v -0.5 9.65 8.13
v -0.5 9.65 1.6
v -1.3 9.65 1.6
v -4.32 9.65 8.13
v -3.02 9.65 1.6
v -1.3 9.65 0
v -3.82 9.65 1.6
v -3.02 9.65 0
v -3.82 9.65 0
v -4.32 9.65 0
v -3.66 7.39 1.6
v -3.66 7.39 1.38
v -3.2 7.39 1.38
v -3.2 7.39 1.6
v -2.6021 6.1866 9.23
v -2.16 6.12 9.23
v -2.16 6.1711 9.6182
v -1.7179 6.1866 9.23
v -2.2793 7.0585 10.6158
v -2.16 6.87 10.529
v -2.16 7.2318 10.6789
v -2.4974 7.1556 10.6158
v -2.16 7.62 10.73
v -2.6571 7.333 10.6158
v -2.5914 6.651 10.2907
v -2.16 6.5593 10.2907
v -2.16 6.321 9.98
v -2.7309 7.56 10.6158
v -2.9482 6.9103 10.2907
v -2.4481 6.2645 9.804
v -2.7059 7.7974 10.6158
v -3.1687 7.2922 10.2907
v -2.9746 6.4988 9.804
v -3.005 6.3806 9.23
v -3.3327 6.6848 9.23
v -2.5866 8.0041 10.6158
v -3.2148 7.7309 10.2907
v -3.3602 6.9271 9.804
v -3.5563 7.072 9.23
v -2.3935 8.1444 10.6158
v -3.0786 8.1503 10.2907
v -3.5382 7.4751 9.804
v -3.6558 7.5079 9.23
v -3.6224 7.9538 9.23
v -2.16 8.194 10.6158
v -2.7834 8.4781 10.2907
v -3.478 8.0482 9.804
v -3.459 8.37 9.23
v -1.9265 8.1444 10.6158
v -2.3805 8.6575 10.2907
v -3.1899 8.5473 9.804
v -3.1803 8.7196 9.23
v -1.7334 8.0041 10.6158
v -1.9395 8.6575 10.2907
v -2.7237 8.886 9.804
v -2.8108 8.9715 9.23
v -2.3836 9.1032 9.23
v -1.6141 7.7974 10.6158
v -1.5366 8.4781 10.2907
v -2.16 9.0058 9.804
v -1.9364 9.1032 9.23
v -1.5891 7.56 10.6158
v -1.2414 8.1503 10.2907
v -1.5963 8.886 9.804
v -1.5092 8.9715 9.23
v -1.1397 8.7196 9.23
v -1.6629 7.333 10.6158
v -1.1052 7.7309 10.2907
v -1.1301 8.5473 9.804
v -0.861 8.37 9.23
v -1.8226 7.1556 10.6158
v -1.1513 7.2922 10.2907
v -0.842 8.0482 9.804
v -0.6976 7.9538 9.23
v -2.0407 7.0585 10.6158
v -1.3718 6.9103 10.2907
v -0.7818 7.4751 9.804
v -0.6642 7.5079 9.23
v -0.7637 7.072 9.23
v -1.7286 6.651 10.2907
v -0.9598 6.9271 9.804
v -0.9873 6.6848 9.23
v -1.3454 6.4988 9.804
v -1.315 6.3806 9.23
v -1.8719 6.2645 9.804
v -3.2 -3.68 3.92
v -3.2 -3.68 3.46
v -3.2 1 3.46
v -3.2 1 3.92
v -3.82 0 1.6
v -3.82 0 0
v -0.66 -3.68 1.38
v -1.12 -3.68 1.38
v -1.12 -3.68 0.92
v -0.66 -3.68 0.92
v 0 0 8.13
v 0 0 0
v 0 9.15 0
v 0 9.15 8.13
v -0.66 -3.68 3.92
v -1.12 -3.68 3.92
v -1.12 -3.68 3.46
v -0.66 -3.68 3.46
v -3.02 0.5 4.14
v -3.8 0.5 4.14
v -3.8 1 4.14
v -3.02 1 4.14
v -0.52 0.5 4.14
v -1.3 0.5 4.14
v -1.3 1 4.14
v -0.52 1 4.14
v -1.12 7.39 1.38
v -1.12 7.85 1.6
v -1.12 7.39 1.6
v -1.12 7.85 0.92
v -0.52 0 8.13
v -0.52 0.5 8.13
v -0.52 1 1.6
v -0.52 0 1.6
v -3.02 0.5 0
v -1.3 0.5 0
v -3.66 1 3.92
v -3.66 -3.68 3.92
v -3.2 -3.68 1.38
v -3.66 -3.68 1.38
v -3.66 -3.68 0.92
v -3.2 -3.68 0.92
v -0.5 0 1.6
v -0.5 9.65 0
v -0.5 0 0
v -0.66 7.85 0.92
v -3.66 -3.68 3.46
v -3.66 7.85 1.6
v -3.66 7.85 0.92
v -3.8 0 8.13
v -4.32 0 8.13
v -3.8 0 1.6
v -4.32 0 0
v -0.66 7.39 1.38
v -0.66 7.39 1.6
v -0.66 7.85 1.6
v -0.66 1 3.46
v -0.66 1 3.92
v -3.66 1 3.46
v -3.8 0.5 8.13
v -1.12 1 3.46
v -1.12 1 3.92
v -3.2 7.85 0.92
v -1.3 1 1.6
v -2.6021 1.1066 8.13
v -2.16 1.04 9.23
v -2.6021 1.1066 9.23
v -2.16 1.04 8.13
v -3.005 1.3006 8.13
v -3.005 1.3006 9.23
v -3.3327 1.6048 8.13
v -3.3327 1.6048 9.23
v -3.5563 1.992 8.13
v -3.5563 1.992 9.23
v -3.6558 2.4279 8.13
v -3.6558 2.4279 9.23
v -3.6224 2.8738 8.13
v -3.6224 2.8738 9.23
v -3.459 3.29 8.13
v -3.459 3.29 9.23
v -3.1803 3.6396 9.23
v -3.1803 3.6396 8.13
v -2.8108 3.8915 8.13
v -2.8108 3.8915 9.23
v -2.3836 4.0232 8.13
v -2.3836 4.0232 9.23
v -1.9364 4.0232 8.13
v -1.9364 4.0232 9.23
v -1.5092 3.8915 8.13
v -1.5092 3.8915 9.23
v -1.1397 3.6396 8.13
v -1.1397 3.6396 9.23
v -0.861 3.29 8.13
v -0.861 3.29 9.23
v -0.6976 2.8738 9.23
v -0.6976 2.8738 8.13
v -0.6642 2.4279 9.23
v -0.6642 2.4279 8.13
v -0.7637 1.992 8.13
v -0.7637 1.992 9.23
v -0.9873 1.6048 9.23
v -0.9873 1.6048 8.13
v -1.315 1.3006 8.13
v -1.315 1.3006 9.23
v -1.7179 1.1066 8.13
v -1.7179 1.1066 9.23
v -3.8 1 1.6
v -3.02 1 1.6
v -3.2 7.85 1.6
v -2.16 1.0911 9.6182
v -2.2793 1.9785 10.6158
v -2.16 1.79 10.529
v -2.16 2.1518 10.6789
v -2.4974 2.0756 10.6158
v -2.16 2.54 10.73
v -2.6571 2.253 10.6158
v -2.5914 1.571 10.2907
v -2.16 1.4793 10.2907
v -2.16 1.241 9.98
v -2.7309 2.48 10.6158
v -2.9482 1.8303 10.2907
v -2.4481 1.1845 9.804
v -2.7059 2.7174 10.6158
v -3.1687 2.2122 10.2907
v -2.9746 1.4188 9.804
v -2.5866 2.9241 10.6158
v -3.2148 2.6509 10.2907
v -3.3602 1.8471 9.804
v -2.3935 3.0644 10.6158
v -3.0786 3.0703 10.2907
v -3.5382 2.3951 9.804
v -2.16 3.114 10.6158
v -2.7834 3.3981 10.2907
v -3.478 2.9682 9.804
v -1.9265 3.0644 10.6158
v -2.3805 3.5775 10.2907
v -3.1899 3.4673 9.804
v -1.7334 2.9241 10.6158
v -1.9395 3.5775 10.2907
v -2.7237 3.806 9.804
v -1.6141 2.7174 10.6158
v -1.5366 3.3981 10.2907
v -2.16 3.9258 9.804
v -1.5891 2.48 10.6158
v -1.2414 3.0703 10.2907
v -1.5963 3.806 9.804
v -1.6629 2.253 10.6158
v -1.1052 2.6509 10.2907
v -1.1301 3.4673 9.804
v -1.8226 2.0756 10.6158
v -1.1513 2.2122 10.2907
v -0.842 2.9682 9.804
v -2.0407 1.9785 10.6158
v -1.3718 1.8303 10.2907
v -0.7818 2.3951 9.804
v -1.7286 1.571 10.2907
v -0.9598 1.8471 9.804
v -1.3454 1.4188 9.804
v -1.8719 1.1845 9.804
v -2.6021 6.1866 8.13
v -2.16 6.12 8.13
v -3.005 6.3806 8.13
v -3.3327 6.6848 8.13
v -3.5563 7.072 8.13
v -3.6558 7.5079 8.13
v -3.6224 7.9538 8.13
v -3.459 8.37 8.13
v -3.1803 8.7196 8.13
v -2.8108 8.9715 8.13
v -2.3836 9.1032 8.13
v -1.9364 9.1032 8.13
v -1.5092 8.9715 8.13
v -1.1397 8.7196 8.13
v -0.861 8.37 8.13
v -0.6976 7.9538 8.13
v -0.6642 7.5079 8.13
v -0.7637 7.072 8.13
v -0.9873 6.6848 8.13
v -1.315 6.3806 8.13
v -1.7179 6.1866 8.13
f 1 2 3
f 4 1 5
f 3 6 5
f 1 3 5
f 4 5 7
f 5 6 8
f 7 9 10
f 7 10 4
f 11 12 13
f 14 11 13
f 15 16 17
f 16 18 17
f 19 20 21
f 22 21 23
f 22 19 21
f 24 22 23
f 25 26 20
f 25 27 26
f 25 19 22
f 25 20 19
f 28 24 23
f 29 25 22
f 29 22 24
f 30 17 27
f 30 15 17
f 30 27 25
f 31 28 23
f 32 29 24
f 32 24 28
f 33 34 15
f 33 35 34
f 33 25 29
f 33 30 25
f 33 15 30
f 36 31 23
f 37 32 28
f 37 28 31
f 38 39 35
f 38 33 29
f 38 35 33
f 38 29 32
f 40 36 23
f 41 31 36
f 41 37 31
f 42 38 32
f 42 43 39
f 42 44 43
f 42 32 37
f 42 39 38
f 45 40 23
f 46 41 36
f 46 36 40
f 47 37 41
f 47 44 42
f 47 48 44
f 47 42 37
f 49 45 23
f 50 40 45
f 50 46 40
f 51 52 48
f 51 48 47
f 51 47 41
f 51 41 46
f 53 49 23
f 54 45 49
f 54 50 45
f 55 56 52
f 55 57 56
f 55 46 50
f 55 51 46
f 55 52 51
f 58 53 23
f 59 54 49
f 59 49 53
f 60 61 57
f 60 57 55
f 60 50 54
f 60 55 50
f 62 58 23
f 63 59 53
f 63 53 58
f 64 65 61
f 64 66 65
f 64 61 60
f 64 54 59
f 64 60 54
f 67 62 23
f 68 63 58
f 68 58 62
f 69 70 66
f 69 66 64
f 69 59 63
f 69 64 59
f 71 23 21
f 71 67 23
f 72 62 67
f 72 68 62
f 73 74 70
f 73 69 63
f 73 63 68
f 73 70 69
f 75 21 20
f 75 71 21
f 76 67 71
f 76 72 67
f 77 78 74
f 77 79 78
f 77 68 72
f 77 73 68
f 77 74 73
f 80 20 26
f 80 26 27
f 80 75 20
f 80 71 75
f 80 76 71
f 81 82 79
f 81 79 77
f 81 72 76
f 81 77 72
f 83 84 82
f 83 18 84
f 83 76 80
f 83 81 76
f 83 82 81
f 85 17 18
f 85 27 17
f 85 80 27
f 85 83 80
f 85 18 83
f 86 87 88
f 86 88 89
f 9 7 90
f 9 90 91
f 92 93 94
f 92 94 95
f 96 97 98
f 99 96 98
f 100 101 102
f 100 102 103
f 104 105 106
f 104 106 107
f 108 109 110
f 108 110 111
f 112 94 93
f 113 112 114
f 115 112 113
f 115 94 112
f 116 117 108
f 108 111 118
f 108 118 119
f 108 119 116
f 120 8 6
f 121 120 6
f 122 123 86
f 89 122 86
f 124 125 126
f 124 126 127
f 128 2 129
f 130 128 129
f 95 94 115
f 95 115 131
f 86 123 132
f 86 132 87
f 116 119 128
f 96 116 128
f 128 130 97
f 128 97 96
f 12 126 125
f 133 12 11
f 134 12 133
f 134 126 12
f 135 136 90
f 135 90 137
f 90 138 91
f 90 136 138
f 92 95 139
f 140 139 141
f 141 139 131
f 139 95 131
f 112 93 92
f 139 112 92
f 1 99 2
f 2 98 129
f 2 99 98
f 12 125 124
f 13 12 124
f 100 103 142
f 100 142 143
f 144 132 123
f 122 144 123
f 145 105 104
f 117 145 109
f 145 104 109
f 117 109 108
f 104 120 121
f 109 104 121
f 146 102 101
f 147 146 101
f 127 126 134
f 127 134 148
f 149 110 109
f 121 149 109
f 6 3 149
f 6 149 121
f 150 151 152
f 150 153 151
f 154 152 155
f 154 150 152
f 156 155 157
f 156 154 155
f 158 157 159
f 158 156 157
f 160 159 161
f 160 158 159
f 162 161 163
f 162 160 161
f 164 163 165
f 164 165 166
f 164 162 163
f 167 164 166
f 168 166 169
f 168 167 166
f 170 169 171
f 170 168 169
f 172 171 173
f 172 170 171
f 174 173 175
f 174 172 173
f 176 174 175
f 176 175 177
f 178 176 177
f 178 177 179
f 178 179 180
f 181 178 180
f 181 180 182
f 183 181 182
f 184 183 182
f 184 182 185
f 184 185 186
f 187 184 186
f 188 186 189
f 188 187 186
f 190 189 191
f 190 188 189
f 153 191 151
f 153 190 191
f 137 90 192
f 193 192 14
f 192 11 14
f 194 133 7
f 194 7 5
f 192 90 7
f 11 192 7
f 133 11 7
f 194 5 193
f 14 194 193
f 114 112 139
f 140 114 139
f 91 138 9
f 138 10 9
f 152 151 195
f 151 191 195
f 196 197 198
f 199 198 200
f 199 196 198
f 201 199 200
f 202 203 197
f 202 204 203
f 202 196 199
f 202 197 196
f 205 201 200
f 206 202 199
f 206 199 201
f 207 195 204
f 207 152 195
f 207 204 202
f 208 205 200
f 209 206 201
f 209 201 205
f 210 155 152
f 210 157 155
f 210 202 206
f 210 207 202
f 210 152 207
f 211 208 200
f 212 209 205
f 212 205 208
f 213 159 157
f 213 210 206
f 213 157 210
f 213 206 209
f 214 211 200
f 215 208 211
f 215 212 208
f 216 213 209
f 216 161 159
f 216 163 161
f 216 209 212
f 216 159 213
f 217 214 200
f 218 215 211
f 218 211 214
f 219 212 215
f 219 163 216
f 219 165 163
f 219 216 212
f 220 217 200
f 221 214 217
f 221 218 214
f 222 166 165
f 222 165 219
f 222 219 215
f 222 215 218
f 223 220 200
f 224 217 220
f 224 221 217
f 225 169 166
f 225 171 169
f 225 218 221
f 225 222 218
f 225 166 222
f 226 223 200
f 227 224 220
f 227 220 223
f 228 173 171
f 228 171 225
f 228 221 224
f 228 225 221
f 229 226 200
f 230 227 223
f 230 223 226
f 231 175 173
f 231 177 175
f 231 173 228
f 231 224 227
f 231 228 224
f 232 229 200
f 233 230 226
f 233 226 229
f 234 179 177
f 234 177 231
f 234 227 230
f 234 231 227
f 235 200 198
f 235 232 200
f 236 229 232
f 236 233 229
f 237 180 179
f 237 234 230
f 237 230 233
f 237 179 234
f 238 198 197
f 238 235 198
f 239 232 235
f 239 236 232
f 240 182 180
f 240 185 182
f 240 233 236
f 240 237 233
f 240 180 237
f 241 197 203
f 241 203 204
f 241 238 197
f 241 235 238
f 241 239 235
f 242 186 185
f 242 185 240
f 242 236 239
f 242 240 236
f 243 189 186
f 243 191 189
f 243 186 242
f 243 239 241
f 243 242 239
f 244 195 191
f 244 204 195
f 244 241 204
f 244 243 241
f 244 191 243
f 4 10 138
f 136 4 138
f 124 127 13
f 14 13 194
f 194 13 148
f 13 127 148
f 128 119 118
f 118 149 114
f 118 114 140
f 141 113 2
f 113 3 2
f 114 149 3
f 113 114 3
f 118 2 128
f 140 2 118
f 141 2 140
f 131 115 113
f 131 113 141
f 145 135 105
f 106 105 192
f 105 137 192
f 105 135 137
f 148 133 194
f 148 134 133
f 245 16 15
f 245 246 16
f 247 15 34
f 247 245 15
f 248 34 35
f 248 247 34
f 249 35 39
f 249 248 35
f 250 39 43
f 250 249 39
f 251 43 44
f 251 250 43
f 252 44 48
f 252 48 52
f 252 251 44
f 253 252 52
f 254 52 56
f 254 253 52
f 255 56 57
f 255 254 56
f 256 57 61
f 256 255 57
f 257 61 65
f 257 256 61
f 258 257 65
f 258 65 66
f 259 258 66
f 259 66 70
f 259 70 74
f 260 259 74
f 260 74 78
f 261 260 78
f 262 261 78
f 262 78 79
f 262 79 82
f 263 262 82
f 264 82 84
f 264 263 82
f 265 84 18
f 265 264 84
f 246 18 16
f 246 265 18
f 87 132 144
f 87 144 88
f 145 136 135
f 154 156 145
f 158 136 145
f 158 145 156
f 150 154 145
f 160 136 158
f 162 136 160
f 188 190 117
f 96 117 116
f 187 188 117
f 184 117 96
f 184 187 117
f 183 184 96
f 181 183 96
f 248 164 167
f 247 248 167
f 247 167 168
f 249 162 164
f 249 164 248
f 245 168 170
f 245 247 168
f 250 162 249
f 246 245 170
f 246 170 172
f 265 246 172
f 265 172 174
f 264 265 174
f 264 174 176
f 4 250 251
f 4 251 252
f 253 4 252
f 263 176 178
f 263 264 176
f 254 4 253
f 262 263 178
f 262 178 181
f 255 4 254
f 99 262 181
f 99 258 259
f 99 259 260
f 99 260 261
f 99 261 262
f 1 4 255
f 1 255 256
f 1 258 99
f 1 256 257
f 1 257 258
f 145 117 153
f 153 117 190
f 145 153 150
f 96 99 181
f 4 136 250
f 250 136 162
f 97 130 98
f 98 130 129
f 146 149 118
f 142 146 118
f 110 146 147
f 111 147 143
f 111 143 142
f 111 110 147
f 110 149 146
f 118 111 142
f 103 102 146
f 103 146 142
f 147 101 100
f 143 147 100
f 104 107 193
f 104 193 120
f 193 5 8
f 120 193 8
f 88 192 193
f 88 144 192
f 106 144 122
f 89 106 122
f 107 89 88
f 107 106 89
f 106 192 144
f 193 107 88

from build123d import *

# Parameters (mm, degrees)
EXTRUSION1_DEPTH   = 8.13
ESQUISSE2_W        = 0.8
ESQUISSE2_H        = 1.6
EXTRUSION2_DEPTH   = 10.55
ESQUISSE4_W        = 0.78
ESQUISSE4_H        = 2.54
EXTRUSION3_DEPTH   = 0.5
ESQUISSE5_W        = 0.46
ESQUISSE5_H        = 0.46
EXTRUSION4_DEPTH   = 4.68
ESQUISSE6_W        = 0.46
ESQUISSE6_H        = 0.46
EXTRUSION5_DEPTH   = 11.53
EXTRUSION5_2_DEPTH = 11.53
ESQUISSE7_W        = 0.46
ESQUISSE7_H        = 0.46
EXTRUSION6_DEPTH   = 0.22


with BuildPart() as part:
    # Esquisse1 → Extrusion1 (new body)
    with BuildSketch(Plane.XY):
        Polygon((-3.8, 0), (-3.8, 0.5), (-0.52, 0.5), (-0.52, 0), (0, 0), (0, 9.15), (-0.5, 9.65), (-4.32, 9.65), (-4.32, 0), align=None)
    extrude(amount=EXTRUSION1_DEPTH)

    # Esquisse2 → Extrusion2 (cut)
    with BuildSketch(Plane(origin=(0, 9.65, 0), x_dir=(1, 0, 0), z_dir=(0, 1, 0))):
        with Locations((-0.9, -0.8)):
            Rectangle(ESQUISSE2_W, ESQUISSE2_H)
        with Locations((-3.42, -0.8)):
            Rectangle(ESQUISSE2_W, ESQUISSE2_H)
    extrude(amount=-EXTRUSION2_DEPTH, mode=Mode.SUBTRACT)

    # Esquisse4 → Extrusion3 (cut)
    with BuildSketch(Plane.XZ.offset(-0.5)):
        with Locations((-3.41, 2.87)):
            Rectangle(ESQUISSE4_W, ESQUISSE4_H)
        with Locations((-0.91, 2.87)):
            Rectangle(ESQUISSE4_W, ESQUISSE4_H)
    extrude(amount=-EXTRUSION3_DEPTH, mode=Mode.SUBTRACT)

    # Esquisse5 → Extrusion4 (add)
    with BuildSketch(Plane.XZ.offset(3.68)):
        with Locations((-3.43, 3.69)):
            Rectangle(ESQUISSE5_W, ESQUISSE5_H)
        with Locations((-0.89, 3.69)):
            Rectangle(ESQUISSE5_W, ESQUISSE5_H)
    extrude(amount=-EXTRUSION4_DEPTH)



with BuildPart() as body_2:
    # Esquisse6 → Extrusion5 (new body)
    with BuildSketch(Plane.XZ.offset(3.68)):
        with Locations((-3.43, 1.15)):
            Rectangle(ESQUISSE6_W, ESQUISSE6_H)
    extrude(amount=-EXTRUSION5_DEPTH)


with BuildPart() as body_3:
    # Esquisse6 → Extrusion5 2 (new body)
    with BuildSketch(Plane.XZ.offset(3.68)):
        with Locations((-0.89, 1.15)):
            Rectangle(ESQUISSE6_W, ESQUISSE6_H)
    extrude(amount=-EXTRUSION5_2_DEPTH)


with BuildPart() as part_1:
    add(part.part)

    add(body_2.part)  # Extrusion6 merges body 2

    add(body_3.part)  # Extrusion6 merges body 3
    # Esquisse7 → Extrusion6 (add)
    with BuildSketch(Plane.XY.offset(1.38)):
        with Locations((-0.89, 7.62)):
            Rectangle(ESQUISSE7_W, ESQUISSE7_H)
        with Locations((-3.43, 7.62)):
            Rectangle(ESQUISSE7_W, ESQUISSE7_H)
    extrude(amount=EXTRUSION6_DEPTH)

    # Esquisse9 → Révolution1 (revolve)
    with BuildSketch(Plane(origin=(-2.16, 0, 0), x_dir=(0, 0, -1), z_dir=(1, 0, 0))):
        with BuildLine():
            Line((-9.23, 1.04), (-8.13, 1.04))
            Line((-8.13, 1.04), (-8.13, 2.54))
            Line((-8.13, 2.54), (-10.73, 2.54))
            ThreePointArc((-10.73, 2.54), (-10.290660172, 1.479339828), (-9.23, 1.04))
        make_face()
    revolve(axis=Axis((-2.16, 2.54, 13.741236879), (0, 0, -1)))

    # Esquisse10 → Révolution2 (revolve)
    with BuildSketch(Plane(origin=(-2.16, 0, 0), x_dir=(0, 0, -1), z_dir=(1, 0, 0))):
        with BuildLine():
            Line((-9.23, 6.12), (-8.13, 6.12))
            Line((-8.13, 6.12), (-8.13, 7.62))
            Line((-8.13, 7.62), (-10.73, 7.62))
            ThreePointArc((-10.73, 7.62), (-10.290660172, 6.559339828), (-9.23, 6.12))
        make_face()
    revolve(axis=Axis((-2.16, 7.62, 13.129927016), (0, 0, -1)))


solid = part_1.part
